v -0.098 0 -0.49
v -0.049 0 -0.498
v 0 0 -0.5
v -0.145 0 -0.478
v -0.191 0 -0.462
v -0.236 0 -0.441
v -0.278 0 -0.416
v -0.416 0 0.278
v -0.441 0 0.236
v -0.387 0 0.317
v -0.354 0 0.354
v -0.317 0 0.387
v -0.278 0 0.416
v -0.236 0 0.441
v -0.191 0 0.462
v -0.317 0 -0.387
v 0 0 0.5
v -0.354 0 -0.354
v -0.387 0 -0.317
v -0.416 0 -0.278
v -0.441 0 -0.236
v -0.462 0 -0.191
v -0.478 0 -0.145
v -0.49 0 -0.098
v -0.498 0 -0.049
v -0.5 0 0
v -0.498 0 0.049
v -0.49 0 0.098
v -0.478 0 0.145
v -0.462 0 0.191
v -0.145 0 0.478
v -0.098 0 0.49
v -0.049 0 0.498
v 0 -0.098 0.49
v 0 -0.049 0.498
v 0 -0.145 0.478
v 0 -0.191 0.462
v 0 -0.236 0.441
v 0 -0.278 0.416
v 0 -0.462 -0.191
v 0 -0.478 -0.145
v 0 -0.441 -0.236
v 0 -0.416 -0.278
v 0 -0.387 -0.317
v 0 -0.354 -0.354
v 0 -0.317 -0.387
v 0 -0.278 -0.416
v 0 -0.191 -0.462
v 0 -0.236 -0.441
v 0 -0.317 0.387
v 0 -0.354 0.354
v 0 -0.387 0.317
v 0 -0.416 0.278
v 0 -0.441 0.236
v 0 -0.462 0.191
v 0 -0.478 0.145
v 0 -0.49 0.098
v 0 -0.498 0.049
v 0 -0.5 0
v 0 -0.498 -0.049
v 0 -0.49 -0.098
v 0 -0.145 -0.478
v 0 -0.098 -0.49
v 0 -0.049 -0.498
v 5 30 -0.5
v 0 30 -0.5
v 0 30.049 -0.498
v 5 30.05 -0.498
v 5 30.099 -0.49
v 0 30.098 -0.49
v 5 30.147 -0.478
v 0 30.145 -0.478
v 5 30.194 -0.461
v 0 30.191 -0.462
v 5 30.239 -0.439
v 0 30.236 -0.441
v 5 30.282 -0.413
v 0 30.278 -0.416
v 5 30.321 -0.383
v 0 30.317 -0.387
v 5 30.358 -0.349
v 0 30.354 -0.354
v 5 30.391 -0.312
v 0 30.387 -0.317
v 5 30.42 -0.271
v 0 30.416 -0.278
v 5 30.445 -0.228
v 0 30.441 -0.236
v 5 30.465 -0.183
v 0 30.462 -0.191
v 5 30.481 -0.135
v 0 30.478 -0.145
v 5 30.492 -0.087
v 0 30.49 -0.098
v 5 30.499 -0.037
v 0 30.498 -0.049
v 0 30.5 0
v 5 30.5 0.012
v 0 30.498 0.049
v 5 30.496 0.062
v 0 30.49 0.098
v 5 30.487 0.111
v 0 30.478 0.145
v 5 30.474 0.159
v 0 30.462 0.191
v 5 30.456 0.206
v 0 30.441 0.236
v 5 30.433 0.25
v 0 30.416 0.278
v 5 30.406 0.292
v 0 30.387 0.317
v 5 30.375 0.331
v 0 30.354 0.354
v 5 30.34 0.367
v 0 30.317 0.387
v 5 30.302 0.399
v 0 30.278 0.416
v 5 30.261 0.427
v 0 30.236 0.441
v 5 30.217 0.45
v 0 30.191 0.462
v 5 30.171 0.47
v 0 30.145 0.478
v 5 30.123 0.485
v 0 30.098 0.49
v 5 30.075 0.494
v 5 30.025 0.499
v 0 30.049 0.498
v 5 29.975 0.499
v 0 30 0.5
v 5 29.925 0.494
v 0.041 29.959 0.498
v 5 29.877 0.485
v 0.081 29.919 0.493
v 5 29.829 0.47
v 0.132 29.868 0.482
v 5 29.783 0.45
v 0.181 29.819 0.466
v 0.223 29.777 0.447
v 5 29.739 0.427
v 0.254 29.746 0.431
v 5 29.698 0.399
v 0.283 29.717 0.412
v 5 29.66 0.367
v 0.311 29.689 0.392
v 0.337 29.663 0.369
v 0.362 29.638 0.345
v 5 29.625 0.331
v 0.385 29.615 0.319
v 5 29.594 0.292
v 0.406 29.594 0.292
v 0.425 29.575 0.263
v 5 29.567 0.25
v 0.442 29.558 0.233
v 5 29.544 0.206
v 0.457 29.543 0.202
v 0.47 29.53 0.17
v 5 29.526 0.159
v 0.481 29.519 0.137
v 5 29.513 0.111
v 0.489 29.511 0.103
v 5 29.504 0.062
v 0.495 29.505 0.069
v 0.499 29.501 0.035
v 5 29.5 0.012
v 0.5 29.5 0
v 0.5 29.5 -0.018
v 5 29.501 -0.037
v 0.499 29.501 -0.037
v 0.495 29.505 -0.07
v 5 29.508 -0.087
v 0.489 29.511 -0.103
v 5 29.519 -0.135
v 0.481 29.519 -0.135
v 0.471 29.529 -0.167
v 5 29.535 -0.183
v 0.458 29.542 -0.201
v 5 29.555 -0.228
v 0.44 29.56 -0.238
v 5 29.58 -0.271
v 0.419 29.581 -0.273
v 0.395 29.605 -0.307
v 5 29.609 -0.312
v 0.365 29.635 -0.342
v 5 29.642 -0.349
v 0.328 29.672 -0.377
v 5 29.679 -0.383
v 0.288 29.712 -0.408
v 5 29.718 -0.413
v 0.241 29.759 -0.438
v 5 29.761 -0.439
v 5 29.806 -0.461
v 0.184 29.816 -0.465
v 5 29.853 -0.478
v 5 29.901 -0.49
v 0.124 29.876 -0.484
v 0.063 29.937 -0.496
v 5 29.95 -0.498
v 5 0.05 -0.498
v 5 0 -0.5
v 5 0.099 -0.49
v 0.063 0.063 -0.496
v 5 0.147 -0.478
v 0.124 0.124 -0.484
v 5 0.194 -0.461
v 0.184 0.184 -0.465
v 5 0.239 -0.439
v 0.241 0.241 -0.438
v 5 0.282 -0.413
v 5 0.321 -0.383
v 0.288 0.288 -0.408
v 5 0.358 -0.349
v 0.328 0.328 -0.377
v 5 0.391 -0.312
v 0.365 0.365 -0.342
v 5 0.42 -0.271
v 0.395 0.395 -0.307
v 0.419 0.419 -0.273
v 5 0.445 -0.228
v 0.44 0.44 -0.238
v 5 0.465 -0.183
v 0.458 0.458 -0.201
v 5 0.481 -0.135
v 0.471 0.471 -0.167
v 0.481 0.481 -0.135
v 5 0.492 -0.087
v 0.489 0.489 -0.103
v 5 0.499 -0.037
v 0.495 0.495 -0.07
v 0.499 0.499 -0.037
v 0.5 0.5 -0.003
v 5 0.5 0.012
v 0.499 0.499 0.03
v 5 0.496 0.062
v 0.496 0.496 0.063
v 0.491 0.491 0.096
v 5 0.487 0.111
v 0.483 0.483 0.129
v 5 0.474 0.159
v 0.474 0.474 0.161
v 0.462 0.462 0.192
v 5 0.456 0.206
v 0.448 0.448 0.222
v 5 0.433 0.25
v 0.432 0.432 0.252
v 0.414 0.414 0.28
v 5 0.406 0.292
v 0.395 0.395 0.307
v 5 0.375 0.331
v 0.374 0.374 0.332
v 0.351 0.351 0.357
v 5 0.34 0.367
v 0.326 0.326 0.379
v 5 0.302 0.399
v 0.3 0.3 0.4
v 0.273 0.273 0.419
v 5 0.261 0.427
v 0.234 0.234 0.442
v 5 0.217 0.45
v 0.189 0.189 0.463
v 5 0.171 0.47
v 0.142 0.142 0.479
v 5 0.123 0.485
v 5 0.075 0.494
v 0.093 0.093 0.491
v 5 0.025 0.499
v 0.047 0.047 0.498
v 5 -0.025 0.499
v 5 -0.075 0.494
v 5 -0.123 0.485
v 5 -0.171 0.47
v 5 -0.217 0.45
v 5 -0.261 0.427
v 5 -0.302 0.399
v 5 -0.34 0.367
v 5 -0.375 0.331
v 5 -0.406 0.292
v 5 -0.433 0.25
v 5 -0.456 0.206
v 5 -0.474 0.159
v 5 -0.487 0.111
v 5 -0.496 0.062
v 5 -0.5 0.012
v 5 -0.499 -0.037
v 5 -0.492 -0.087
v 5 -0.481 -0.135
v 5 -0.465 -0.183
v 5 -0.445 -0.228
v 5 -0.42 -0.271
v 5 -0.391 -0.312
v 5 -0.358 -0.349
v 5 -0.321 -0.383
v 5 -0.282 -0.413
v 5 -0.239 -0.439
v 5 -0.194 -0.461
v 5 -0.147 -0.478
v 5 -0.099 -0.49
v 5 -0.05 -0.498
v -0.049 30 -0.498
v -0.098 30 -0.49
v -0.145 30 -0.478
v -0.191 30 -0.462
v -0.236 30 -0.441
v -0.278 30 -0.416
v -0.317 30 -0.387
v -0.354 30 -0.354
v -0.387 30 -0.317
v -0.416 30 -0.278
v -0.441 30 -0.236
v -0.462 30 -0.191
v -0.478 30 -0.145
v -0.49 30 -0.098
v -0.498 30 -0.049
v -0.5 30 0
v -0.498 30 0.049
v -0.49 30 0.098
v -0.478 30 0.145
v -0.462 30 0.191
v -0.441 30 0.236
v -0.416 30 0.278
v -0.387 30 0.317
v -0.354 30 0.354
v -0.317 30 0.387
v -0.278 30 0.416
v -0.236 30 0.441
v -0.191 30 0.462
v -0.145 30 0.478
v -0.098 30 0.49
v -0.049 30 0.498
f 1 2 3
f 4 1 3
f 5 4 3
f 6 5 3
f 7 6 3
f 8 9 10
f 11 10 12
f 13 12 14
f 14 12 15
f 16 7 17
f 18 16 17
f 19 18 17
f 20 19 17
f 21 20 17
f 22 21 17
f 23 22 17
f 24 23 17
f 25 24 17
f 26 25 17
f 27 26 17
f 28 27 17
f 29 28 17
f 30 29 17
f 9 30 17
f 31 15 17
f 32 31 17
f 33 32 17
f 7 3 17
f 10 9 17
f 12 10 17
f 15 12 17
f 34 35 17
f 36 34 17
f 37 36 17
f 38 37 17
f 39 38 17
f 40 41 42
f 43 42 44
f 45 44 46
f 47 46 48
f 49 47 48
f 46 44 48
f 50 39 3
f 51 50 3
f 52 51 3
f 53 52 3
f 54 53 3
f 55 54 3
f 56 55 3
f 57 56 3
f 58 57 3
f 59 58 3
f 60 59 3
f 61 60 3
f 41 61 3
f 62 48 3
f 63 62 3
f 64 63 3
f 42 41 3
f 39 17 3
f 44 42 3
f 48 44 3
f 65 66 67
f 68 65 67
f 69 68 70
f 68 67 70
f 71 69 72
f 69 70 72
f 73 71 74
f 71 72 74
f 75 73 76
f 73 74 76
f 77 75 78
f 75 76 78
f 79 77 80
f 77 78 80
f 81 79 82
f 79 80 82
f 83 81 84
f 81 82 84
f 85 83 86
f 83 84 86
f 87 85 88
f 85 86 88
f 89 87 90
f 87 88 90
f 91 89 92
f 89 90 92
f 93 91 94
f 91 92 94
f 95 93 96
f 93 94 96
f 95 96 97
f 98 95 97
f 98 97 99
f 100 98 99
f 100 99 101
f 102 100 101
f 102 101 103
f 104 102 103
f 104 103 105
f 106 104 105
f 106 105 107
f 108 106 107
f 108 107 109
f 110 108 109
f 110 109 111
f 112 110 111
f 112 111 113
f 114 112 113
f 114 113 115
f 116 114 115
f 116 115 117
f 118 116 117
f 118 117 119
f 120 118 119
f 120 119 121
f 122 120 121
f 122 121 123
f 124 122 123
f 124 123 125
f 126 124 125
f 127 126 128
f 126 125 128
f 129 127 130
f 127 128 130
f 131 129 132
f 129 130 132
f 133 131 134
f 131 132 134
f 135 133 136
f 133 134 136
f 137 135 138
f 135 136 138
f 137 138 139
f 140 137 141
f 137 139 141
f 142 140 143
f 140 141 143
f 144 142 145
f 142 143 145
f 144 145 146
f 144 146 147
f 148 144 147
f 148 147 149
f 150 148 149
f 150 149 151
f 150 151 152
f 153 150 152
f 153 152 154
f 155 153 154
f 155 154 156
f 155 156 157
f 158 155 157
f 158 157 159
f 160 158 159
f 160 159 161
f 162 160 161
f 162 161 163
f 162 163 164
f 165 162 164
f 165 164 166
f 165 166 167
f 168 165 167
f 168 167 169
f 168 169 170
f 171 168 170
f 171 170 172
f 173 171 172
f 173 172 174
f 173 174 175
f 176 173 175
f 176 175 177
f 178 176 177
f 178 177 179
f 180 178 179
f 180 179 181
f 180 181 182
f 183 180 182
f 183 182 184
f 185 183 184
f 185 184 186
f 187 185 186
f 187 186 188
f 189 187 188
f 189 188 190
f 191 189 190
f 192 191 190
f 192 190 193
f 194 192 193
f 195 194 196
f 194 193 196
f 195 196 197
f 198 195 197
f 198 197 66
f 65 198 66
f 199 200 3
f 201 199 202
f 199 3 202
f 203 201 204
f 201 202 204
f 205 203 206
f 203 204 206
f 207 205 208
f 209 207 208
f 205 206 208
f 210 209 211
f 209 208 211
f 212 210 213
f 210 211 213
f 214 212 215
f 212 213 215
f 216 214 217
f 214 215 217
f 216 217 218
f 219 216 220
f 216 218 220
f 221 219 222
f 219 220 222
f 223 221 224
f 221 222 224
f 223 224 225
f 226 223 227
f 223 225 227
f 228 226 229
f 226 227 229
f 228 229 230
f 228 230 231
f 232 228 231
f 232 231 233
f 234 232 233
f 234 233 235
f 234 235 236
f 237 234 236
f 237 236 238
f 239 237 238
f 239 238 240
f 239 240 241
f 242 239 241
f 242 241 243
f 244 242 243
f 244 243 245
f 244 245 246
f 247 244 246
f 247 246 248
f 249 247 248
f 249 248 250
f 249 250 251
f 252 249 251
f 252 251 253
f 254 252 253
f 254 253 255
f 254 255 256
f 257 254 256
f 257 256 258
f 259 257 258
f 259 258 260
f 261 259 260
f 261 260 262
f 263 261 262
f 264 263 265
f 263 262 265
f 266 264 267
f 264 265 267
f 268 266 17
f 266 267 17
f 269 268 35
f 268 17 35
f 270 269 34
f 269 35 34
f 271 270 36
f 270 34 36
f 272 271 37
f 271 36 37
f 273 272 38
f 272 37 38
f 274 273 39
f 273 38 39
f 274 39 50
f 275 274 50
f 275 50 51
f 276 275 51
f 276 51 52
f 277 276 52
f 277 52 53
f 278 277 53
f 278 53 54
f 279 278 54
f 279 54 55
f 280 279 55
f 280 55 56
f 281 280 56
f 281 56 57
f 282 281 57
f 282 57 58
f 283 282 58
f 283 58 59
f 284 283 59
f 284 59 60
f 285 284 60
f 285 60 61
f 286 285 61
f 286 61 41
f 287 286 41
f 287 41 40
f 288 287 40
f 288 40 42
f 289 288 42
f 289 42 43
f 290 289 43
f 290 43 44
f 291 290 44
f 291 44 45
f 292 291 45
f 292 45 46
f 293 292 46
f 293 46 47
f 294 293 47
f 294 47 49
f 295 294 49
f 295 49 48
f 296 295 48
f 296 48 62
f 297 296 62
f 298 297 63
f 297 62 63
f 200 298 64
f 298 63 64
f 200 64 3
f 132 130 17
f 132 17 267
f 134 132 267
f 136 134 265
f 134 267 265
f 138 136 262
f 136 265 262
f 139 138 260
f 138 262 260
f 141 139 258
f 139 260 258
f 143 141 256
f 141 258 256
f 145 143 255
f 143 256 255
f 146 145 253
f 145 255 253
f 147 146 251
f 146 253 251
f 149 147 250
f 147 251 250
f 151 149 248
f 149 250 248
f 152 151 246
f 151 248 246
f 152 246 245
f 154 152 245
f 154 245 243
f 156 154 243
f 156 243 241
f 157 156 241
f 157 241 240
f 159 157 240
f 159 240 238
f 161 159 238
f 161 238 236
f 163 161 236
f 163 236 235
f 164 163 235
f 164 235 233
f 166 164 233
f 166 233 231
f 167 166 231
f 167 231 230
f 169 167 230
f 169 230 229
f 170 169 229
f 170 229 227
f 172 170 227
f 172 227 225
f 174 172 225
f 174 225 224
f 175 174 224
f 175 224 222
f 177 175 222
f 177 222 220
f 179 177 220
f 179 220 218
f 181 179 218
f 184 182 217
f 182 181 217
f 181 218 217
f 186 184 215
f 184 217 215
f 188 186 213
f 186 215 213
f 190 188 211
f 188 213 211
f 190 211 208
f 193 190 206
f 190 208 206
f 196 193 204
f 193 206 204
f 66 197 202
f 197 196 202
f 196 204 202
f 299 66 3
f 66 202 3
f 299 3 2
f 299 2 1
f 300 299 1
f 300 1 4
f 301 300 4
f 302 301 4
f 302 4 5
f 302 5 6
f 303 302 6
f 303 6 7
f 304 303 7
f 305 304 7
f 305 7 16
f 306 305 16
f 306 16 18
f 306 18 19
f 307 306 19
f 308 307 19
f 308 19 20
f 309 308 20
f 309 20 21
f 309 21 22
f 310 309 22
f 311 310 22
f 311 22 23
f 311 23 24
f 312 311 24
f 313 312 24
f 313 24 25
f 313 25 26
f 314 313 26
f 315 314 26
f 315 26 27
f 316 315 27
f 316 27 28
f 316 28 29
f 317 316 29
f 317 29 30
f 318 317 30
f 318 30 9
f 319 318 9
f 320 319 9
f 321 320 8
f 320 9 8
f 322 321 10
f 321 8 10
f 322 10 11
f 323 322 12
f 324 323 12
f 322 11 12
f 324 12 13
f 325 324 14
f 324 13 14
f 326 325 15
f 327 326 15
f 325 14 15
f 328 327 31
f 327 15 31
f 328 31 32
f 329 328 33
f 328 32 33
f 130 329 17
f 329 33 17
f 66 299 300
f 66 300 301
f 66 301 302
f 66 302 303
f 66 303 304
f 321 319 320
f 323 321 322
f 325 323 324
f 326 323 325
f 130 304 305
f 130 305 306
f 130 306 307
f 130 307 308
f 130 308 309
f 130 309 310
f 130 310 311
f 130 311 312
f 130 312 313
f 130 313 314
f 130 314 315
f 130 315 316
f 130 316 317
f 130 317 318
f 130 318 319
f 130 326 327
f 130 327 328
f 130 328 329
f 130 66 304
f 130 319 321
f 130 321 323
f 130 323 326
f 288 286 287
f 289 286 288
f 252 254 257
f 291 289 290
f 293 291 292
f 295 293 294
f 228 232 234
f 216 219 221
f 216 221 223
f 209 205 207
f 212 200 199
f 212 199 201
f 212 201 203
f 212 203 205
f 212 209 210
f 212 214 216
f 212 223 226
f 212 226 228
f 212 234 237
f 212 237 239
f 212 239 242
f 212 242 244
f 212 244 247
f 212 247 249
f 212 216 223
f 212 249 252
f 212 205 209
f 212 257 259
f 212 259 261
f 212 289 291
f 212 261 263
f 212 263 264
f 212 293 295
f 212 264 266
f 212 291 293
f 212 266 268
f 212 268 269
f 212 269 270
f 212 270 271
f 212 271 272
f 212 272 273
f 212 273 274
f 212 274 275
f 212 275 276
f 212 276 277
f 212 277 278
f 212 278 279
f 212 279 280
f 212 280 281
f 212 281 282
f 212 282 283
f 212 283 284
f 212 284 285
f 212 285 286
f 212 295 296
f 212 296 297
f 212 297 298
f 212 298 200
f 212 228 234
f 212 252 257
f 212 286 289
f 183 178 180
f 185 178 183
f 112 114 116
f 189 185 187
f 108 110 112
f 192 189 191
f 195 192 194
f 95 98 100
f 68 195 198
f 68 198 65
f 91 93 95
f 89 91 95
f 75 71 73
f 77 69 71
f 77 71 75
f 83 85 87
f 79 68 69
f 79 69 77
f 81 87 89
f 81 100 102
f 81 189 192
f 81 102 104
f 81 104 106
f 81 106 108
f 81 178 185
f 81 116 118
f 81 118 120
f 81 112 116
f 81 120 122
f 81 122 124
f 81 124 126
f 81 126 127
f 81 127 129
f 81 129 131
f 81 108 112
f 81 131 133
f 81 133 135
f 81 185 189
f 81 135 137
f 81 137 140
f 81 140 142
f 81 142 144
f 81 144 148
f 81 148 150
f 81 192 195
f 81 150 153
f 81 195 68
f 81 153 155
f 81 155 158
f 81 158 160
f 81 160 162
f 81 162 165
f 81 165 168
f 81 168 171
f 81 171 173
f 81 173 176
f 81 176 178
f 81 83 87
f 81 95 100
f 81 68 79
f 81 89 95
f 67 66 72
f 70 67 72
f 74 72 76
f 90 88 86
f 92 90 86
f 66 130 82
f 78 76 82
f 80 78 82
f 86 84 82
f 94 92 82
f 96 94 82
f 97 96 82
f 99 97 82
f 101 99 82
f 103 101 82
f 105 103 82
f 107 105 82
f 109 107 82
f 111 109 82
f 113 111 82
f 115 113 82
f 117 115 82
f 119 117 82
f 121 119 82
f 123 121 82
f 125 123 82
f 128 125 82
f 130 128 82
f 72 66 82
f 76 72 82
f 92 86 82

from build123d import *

# Parameters (mm, degrees)
SKETCH1_R           = 0.5
BOSS_EXTRUDE2_DEPTH = 30
SKETCH9_R           = 0.5
BOSS_EXTRUDE3_DEPTH = 5


with BuildPart() as part:
    # Sketch1 → Boss-Extrude2 (new body)
    with BuildSketch(Plane(origin=(0, 0, 0), x_dir=(1, 0, 0), z_dir=(0, 1, 0))):
        with Locations(Location((0, 0, 0), (0, 0, 270))):
            Circle(SKETCH1_R)
    extrude(amount=BOSS_EXTRUDE2_DEPTH)

    # Sketch9 → Boss-Extrude3 (add)
    with BuildSketch(Plane(origin=(0, 0, 0), x_dir=(0, 0, -1), z_dir=(1, 0, 0))):
        Circle(SKETCH9_R)
        with Locations((0, 30)):
            Circle(SKETCH9_R)
    extrude(amount=BOSS_EXTRUDE3_DEPTH)


solid = part.part
